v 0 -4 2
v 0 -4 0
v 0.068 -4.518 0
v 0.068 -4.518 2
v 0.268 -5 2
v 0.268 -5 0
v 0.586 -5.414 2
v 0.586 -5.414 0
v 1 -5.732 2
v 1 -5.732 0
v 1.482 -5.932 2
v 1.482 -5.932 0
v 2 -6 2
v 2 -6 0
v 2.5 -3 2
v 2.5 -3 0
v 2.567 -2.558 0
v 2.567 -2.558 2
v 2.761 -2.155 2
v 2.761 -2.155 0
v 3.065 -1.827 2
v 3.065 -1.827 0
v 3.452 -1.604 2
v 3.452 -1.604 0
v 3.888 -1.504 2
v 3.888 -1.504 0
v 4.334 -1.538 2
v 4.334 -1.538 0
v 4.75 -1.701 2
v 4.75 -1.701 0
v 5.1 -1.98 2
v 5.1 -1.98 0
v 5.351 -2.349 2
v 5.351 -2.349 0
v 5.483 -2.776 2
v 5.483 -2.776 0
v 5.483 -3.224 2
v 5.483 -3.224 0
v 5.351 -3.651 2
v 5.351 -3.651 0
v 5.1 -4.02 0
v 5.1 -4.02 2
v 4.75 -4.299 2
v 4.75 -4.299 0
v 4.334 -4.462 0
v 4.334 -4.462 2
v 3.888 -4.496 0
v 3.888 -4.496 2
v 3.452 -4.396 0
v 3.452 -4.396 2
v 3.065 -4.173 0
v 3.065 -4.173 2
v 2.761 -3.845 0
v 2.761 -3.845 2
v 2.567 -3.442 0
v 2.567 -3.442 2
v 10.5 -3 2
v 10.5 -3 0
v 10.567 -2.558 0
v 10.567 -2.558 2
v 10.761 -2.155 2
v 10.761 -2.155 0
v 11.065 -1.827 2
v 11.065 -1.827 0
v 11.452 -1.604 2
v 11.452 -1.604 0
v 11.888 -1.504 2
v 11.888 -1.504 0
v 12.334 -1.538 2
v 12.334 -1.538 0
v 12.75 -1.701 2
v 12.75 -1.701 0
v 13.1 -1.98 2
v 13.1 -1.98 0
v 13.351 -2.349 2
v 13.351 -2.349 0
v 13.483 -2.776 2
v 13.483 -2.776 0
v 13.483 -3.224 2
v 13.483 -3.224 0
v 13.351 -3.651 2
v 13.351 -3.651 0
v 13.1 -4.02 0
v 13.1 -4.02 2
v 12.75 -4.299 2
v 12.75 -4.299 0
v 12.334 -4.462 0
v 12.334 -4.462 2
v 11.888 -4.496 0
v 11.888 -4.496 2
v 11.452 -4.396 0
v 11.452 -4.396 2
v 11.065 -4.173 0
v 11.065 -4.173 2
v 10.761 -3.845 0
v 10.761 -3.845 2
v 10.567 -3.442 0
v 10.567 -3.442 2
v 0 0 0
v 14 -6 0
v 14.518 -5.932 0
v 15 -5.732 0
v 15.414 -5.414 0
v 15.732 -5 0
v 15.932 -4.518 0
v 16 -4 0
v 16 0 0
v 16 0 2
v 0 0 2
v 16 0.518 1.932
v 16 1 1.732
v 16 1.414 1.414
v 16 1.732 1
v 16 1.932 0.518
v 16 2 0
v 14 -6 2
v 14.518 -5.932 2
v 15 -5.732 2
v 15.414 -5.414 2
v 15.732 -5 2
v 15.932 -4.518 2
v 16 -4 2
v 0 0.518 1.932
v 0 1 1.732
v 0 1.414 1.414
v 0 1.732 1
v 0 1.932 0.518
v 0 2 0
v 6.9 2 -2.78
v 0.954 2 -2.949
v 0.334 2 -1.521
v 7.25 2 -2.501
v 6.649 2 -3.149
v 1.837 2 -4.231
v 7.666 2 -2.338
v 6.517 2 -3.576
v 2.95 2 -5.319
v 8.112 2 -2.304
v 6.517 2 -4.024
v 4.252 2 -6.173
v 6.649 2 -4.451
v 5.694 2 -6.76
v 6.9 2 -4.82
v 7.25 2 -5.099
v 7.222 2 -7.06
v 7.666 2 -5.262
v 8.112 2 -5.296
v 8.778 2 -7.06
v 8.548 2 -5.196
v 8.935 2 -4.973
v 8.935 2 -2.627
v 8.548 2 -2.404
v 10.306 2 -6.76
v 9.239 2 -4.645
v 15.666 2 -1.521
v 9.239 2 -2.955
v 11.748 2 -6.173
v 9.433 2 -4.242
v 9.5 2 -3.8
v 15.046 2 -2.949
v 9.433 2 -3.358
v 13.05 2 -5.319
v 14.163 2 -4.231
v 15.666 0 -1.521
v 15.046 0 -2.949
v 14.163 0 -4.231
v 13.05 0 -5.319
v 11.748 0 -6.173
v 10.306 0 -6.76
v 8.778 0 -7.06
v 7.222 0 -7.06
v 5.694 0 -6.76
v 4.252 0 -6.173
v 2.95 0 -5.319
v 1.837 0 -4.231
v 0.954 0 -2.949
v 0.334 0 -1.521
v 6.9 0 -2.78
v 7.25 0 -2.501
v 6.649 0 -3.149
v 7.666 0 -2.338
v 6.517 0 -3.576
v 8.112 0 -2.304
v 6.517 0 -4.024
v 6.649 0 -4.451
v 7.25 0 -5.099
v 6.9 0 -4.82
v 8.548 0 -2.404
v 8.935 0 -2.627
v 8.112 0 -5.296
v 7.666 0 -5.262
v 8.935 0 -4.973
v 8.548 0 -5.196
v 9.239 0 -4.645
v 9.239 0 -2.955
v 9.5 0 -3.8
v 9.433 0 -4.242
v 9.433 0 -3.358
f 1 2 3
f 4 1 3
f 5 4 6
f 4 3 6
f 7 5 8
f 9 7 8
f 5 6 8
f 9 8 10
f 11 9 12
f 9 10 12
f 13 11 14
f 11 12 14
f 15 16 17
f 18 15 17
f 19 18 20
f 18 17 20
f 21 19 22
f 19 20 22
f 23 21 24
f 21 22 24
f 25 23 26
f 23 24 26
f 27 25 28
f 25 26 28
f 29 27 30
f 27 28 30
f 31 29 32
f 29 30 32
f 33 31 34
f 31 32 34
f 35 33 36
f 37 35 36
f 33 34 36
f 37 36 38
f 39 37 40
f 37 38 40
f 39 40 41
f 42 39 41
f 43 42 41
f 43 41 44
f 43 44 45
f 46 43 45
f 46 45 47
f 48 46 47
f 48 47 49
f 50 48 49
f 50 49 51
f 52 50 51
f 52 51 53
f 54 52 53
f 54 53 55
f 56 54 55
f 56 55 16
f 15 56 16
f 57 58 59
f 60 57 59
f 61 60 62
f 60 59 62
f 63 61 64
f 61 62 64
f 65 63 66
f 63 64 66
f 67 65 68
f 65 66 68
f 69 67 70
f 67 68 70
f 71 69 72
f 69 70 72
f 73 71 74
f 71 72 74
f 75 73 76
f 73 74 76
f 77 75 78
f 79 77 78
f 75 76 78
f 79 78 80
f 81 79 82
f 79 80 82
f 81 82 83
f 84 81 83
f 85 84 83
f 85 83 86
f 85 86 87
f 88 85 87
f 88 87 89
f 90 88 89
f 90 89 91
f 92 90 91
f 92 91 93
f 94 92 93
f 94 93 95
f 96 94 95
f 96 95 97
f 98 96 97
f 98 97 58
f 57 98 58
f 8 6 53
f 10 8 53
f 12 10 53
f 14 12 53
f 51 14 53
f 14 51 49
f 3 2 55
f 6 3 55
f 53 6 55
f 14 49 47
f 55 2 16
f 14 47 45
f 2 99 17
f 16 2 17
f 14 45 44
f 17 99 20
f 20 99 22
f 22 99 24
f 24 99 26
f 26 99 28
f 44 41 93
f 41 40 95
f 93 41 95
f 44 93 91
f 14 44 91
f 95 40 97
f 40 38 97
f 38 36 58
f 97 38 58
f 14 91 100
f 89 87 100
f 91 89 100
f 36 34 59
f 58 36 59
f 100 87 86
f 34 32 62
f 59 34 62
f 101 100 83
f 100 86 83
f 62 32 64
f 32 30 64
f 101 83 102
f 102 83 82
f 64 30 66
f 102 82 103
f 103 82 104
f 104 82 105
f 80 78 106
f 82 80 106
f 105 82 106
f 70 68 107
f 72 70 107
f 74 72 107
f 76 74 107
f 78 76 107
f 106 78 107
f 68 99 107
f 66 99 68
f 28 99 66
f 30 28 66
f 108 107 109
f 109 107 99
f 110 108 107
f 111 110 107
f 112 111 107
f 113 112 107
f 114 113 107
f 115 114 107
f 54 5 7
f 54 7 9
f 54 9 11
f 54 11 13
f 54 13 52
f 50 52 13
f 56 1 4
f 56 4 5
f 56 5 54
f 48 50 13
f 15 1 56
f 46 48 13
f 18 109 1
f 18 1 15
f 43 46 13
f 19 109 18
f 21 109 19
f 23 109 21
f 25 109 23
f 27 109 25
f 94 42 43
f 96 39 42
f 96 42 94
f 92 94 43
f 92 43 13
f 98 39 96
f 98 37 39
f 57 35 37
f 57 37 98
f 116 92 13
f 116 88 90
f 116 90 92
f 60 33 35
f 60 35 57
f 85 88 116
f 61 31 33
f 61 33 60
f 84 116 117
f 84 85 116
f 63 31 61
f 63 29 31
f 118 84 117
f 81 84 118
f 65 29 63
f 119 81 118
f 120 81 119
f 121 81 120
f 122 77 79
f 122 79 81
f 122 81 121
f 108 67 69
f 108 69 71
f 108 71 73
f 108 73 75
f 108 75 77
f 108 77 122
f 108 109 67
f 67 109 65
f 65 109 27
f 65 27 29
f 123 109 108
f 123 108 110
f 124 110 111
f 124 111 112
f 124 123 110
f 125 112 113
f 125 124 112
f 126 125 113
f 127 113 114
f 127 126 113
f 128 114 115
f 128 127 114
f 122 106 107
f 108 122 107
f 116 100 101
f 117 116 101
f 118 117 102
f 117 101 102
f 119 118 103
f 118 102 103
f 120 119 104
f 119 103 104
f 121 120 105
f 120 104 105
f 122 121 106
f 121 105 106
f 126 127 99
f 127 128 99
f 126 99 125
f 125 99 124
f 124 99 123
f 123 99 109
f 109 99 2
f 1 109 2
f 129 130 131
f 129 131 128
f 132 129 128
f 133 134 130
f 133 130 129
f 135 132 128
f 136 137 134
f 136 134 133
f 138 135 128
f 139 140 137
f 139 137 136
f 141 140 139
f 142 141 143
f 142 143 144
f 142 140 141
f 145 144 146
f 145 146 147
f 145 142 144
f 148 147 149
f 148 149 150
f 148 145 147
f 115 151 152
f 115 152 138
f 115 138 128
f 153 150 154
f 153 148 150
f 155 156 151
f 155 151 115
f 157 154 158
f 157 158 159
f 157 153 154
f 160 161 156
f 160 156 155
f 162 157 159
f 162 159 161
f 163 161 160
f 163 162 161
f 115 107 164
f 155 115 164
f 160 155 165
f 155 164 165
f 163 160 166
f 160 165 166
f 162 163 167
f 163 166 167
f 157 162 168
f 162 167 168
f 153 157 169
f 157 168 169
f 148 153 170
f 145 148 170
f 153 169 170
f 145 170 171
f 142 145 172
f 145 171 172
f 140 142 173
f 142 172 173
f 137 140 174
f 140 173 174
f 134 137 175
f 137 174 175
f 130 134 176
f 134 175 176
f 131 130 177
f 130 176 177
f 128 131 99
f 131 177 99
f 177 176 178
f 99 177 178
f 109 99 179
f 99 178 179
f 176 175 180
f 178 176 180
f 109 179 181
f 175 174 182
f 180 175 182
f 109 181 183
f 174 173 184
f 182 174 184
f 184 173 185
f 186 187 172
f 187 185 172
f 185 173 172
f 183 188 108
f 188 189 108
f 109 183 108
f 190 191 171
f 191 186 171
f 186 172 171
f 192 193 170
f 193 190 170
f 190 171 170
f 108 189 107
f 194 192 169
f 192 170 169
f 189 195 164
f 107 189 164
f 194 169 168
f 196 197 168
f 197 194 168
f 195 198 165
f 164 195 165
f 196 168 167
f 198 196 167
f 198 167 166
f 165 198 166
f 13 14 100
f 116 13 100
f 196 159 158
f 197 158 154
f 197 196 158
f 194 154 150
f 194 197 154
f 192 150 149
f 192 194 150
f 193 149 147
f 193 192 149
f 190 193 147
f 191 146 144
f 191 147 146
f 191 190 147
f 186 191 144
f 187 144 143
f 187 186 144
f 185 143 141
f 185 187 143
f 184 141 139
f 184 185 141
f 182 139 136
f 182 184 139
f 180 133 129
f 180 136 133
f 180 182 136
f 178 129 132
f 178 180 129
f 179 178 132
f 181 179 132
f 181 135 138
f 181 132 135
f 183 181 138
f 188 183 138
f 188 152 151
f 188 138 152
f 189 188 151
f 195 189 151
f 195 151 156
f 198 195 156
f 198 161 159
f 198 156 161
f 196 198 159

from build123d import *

# Parameters (mm, degrees)
BOSS_EXTRUDE1_DEPTH = 2
BOSS_EXTRUDE2_DEPTH = 2
SKETCH10_R          = 1.5
CUT_EXTRUDE3_DEPTH  = 6
CUT_EXTRUDE4_DEPTH  = 16
SKETCH12_R          = 1.5
CUT_EXTRUDE5_DEPTH  = 16


with BuildPart() as part:
    # Sketch1 → Boss-Extrude1 (new body)
    with BuildSketch(Plane.XY):
        with BuildLine():
            Line((0, 0), (0, -4))
            ThreePointArc((0, -4), (0.585786438, -5.414213562), (2, -6))
            Line((2, -6), (14, -6))
            ThreePointArc((14, -6), (15.414213562, -5.414213562), (16, -4))
            Line((16, -4), (16, 0))
            Line((16, 0), (0, 0))
        make_face()
    extrude(amount=BOSS_EXTRUDE1_DEPTH)

    # Sketch10 → Cut-Extrude3 (cut)
    with BuildSketch(Plane(origin=(0, 0, 0), x_dir=(-1, 0, 0), z_dir=(0, 0, -1))):
        with Locations((-12, -3)):
            Circle(SKETCH10_R)
        with Locations((-4, -3)):
            Circle(SKETCH10_R)
    extrude(amount=-CUT_EXTRUDE3_DEPTH, mode=Mode.SUBTRACT)


with BuildPart() as body_2:
    # Sketch5 → Boss-Extrude2 (new body)
    with BuildSketch(Plane(origin=(0, 0, 0), x_dir=(1, 0, 0), z_dir=(0, 1, 0))):
        with BuildLine():
            Line((0, 0), (0, -2))
            Line((0, -2), (16, -2))
            Line((16, -2), (16, 0))
            ThreePointArc((16, 0), (8, 7.097527245), (0, 0))
        make_face()
    extrude(amount=BOSS_EXTRUDE2_DEPTH)

    # Sketch11 → Cut-Extrude4 (cut)
    with BuildSketch(Plane(origin=(0, 0, 0), x_dir=(0, 0, -1), z_dir=(1, 0, 0))):
        with BuildLine():
            Line((0, 2), (-2, 2))
            Line((-2, 2), (-2, 0))
            ThreePointArc((-2, 0), (-1.414213562, 1.414213562), (0, 2))
        make_face()
    extrude(amount=CUT_EXTRUDE4_DEPTH, mode=Mode.SUBTRACT)

    # Sketch12 → Cut-Extrude5 (cut)
    with BuildSketch(Plane(origin=(0, 0, 0), x_dir=(1, 0, 0), z_dir=(0, 1, 0))):
        with Locations((8, 3.8)):
            Circle(SKETCH12_R)
    extrude(amount=CUT_EXTRUDE5_DEPTH, mode=Mode.SUBTRACT)


solid = Compound([part.part, body_2.part])
